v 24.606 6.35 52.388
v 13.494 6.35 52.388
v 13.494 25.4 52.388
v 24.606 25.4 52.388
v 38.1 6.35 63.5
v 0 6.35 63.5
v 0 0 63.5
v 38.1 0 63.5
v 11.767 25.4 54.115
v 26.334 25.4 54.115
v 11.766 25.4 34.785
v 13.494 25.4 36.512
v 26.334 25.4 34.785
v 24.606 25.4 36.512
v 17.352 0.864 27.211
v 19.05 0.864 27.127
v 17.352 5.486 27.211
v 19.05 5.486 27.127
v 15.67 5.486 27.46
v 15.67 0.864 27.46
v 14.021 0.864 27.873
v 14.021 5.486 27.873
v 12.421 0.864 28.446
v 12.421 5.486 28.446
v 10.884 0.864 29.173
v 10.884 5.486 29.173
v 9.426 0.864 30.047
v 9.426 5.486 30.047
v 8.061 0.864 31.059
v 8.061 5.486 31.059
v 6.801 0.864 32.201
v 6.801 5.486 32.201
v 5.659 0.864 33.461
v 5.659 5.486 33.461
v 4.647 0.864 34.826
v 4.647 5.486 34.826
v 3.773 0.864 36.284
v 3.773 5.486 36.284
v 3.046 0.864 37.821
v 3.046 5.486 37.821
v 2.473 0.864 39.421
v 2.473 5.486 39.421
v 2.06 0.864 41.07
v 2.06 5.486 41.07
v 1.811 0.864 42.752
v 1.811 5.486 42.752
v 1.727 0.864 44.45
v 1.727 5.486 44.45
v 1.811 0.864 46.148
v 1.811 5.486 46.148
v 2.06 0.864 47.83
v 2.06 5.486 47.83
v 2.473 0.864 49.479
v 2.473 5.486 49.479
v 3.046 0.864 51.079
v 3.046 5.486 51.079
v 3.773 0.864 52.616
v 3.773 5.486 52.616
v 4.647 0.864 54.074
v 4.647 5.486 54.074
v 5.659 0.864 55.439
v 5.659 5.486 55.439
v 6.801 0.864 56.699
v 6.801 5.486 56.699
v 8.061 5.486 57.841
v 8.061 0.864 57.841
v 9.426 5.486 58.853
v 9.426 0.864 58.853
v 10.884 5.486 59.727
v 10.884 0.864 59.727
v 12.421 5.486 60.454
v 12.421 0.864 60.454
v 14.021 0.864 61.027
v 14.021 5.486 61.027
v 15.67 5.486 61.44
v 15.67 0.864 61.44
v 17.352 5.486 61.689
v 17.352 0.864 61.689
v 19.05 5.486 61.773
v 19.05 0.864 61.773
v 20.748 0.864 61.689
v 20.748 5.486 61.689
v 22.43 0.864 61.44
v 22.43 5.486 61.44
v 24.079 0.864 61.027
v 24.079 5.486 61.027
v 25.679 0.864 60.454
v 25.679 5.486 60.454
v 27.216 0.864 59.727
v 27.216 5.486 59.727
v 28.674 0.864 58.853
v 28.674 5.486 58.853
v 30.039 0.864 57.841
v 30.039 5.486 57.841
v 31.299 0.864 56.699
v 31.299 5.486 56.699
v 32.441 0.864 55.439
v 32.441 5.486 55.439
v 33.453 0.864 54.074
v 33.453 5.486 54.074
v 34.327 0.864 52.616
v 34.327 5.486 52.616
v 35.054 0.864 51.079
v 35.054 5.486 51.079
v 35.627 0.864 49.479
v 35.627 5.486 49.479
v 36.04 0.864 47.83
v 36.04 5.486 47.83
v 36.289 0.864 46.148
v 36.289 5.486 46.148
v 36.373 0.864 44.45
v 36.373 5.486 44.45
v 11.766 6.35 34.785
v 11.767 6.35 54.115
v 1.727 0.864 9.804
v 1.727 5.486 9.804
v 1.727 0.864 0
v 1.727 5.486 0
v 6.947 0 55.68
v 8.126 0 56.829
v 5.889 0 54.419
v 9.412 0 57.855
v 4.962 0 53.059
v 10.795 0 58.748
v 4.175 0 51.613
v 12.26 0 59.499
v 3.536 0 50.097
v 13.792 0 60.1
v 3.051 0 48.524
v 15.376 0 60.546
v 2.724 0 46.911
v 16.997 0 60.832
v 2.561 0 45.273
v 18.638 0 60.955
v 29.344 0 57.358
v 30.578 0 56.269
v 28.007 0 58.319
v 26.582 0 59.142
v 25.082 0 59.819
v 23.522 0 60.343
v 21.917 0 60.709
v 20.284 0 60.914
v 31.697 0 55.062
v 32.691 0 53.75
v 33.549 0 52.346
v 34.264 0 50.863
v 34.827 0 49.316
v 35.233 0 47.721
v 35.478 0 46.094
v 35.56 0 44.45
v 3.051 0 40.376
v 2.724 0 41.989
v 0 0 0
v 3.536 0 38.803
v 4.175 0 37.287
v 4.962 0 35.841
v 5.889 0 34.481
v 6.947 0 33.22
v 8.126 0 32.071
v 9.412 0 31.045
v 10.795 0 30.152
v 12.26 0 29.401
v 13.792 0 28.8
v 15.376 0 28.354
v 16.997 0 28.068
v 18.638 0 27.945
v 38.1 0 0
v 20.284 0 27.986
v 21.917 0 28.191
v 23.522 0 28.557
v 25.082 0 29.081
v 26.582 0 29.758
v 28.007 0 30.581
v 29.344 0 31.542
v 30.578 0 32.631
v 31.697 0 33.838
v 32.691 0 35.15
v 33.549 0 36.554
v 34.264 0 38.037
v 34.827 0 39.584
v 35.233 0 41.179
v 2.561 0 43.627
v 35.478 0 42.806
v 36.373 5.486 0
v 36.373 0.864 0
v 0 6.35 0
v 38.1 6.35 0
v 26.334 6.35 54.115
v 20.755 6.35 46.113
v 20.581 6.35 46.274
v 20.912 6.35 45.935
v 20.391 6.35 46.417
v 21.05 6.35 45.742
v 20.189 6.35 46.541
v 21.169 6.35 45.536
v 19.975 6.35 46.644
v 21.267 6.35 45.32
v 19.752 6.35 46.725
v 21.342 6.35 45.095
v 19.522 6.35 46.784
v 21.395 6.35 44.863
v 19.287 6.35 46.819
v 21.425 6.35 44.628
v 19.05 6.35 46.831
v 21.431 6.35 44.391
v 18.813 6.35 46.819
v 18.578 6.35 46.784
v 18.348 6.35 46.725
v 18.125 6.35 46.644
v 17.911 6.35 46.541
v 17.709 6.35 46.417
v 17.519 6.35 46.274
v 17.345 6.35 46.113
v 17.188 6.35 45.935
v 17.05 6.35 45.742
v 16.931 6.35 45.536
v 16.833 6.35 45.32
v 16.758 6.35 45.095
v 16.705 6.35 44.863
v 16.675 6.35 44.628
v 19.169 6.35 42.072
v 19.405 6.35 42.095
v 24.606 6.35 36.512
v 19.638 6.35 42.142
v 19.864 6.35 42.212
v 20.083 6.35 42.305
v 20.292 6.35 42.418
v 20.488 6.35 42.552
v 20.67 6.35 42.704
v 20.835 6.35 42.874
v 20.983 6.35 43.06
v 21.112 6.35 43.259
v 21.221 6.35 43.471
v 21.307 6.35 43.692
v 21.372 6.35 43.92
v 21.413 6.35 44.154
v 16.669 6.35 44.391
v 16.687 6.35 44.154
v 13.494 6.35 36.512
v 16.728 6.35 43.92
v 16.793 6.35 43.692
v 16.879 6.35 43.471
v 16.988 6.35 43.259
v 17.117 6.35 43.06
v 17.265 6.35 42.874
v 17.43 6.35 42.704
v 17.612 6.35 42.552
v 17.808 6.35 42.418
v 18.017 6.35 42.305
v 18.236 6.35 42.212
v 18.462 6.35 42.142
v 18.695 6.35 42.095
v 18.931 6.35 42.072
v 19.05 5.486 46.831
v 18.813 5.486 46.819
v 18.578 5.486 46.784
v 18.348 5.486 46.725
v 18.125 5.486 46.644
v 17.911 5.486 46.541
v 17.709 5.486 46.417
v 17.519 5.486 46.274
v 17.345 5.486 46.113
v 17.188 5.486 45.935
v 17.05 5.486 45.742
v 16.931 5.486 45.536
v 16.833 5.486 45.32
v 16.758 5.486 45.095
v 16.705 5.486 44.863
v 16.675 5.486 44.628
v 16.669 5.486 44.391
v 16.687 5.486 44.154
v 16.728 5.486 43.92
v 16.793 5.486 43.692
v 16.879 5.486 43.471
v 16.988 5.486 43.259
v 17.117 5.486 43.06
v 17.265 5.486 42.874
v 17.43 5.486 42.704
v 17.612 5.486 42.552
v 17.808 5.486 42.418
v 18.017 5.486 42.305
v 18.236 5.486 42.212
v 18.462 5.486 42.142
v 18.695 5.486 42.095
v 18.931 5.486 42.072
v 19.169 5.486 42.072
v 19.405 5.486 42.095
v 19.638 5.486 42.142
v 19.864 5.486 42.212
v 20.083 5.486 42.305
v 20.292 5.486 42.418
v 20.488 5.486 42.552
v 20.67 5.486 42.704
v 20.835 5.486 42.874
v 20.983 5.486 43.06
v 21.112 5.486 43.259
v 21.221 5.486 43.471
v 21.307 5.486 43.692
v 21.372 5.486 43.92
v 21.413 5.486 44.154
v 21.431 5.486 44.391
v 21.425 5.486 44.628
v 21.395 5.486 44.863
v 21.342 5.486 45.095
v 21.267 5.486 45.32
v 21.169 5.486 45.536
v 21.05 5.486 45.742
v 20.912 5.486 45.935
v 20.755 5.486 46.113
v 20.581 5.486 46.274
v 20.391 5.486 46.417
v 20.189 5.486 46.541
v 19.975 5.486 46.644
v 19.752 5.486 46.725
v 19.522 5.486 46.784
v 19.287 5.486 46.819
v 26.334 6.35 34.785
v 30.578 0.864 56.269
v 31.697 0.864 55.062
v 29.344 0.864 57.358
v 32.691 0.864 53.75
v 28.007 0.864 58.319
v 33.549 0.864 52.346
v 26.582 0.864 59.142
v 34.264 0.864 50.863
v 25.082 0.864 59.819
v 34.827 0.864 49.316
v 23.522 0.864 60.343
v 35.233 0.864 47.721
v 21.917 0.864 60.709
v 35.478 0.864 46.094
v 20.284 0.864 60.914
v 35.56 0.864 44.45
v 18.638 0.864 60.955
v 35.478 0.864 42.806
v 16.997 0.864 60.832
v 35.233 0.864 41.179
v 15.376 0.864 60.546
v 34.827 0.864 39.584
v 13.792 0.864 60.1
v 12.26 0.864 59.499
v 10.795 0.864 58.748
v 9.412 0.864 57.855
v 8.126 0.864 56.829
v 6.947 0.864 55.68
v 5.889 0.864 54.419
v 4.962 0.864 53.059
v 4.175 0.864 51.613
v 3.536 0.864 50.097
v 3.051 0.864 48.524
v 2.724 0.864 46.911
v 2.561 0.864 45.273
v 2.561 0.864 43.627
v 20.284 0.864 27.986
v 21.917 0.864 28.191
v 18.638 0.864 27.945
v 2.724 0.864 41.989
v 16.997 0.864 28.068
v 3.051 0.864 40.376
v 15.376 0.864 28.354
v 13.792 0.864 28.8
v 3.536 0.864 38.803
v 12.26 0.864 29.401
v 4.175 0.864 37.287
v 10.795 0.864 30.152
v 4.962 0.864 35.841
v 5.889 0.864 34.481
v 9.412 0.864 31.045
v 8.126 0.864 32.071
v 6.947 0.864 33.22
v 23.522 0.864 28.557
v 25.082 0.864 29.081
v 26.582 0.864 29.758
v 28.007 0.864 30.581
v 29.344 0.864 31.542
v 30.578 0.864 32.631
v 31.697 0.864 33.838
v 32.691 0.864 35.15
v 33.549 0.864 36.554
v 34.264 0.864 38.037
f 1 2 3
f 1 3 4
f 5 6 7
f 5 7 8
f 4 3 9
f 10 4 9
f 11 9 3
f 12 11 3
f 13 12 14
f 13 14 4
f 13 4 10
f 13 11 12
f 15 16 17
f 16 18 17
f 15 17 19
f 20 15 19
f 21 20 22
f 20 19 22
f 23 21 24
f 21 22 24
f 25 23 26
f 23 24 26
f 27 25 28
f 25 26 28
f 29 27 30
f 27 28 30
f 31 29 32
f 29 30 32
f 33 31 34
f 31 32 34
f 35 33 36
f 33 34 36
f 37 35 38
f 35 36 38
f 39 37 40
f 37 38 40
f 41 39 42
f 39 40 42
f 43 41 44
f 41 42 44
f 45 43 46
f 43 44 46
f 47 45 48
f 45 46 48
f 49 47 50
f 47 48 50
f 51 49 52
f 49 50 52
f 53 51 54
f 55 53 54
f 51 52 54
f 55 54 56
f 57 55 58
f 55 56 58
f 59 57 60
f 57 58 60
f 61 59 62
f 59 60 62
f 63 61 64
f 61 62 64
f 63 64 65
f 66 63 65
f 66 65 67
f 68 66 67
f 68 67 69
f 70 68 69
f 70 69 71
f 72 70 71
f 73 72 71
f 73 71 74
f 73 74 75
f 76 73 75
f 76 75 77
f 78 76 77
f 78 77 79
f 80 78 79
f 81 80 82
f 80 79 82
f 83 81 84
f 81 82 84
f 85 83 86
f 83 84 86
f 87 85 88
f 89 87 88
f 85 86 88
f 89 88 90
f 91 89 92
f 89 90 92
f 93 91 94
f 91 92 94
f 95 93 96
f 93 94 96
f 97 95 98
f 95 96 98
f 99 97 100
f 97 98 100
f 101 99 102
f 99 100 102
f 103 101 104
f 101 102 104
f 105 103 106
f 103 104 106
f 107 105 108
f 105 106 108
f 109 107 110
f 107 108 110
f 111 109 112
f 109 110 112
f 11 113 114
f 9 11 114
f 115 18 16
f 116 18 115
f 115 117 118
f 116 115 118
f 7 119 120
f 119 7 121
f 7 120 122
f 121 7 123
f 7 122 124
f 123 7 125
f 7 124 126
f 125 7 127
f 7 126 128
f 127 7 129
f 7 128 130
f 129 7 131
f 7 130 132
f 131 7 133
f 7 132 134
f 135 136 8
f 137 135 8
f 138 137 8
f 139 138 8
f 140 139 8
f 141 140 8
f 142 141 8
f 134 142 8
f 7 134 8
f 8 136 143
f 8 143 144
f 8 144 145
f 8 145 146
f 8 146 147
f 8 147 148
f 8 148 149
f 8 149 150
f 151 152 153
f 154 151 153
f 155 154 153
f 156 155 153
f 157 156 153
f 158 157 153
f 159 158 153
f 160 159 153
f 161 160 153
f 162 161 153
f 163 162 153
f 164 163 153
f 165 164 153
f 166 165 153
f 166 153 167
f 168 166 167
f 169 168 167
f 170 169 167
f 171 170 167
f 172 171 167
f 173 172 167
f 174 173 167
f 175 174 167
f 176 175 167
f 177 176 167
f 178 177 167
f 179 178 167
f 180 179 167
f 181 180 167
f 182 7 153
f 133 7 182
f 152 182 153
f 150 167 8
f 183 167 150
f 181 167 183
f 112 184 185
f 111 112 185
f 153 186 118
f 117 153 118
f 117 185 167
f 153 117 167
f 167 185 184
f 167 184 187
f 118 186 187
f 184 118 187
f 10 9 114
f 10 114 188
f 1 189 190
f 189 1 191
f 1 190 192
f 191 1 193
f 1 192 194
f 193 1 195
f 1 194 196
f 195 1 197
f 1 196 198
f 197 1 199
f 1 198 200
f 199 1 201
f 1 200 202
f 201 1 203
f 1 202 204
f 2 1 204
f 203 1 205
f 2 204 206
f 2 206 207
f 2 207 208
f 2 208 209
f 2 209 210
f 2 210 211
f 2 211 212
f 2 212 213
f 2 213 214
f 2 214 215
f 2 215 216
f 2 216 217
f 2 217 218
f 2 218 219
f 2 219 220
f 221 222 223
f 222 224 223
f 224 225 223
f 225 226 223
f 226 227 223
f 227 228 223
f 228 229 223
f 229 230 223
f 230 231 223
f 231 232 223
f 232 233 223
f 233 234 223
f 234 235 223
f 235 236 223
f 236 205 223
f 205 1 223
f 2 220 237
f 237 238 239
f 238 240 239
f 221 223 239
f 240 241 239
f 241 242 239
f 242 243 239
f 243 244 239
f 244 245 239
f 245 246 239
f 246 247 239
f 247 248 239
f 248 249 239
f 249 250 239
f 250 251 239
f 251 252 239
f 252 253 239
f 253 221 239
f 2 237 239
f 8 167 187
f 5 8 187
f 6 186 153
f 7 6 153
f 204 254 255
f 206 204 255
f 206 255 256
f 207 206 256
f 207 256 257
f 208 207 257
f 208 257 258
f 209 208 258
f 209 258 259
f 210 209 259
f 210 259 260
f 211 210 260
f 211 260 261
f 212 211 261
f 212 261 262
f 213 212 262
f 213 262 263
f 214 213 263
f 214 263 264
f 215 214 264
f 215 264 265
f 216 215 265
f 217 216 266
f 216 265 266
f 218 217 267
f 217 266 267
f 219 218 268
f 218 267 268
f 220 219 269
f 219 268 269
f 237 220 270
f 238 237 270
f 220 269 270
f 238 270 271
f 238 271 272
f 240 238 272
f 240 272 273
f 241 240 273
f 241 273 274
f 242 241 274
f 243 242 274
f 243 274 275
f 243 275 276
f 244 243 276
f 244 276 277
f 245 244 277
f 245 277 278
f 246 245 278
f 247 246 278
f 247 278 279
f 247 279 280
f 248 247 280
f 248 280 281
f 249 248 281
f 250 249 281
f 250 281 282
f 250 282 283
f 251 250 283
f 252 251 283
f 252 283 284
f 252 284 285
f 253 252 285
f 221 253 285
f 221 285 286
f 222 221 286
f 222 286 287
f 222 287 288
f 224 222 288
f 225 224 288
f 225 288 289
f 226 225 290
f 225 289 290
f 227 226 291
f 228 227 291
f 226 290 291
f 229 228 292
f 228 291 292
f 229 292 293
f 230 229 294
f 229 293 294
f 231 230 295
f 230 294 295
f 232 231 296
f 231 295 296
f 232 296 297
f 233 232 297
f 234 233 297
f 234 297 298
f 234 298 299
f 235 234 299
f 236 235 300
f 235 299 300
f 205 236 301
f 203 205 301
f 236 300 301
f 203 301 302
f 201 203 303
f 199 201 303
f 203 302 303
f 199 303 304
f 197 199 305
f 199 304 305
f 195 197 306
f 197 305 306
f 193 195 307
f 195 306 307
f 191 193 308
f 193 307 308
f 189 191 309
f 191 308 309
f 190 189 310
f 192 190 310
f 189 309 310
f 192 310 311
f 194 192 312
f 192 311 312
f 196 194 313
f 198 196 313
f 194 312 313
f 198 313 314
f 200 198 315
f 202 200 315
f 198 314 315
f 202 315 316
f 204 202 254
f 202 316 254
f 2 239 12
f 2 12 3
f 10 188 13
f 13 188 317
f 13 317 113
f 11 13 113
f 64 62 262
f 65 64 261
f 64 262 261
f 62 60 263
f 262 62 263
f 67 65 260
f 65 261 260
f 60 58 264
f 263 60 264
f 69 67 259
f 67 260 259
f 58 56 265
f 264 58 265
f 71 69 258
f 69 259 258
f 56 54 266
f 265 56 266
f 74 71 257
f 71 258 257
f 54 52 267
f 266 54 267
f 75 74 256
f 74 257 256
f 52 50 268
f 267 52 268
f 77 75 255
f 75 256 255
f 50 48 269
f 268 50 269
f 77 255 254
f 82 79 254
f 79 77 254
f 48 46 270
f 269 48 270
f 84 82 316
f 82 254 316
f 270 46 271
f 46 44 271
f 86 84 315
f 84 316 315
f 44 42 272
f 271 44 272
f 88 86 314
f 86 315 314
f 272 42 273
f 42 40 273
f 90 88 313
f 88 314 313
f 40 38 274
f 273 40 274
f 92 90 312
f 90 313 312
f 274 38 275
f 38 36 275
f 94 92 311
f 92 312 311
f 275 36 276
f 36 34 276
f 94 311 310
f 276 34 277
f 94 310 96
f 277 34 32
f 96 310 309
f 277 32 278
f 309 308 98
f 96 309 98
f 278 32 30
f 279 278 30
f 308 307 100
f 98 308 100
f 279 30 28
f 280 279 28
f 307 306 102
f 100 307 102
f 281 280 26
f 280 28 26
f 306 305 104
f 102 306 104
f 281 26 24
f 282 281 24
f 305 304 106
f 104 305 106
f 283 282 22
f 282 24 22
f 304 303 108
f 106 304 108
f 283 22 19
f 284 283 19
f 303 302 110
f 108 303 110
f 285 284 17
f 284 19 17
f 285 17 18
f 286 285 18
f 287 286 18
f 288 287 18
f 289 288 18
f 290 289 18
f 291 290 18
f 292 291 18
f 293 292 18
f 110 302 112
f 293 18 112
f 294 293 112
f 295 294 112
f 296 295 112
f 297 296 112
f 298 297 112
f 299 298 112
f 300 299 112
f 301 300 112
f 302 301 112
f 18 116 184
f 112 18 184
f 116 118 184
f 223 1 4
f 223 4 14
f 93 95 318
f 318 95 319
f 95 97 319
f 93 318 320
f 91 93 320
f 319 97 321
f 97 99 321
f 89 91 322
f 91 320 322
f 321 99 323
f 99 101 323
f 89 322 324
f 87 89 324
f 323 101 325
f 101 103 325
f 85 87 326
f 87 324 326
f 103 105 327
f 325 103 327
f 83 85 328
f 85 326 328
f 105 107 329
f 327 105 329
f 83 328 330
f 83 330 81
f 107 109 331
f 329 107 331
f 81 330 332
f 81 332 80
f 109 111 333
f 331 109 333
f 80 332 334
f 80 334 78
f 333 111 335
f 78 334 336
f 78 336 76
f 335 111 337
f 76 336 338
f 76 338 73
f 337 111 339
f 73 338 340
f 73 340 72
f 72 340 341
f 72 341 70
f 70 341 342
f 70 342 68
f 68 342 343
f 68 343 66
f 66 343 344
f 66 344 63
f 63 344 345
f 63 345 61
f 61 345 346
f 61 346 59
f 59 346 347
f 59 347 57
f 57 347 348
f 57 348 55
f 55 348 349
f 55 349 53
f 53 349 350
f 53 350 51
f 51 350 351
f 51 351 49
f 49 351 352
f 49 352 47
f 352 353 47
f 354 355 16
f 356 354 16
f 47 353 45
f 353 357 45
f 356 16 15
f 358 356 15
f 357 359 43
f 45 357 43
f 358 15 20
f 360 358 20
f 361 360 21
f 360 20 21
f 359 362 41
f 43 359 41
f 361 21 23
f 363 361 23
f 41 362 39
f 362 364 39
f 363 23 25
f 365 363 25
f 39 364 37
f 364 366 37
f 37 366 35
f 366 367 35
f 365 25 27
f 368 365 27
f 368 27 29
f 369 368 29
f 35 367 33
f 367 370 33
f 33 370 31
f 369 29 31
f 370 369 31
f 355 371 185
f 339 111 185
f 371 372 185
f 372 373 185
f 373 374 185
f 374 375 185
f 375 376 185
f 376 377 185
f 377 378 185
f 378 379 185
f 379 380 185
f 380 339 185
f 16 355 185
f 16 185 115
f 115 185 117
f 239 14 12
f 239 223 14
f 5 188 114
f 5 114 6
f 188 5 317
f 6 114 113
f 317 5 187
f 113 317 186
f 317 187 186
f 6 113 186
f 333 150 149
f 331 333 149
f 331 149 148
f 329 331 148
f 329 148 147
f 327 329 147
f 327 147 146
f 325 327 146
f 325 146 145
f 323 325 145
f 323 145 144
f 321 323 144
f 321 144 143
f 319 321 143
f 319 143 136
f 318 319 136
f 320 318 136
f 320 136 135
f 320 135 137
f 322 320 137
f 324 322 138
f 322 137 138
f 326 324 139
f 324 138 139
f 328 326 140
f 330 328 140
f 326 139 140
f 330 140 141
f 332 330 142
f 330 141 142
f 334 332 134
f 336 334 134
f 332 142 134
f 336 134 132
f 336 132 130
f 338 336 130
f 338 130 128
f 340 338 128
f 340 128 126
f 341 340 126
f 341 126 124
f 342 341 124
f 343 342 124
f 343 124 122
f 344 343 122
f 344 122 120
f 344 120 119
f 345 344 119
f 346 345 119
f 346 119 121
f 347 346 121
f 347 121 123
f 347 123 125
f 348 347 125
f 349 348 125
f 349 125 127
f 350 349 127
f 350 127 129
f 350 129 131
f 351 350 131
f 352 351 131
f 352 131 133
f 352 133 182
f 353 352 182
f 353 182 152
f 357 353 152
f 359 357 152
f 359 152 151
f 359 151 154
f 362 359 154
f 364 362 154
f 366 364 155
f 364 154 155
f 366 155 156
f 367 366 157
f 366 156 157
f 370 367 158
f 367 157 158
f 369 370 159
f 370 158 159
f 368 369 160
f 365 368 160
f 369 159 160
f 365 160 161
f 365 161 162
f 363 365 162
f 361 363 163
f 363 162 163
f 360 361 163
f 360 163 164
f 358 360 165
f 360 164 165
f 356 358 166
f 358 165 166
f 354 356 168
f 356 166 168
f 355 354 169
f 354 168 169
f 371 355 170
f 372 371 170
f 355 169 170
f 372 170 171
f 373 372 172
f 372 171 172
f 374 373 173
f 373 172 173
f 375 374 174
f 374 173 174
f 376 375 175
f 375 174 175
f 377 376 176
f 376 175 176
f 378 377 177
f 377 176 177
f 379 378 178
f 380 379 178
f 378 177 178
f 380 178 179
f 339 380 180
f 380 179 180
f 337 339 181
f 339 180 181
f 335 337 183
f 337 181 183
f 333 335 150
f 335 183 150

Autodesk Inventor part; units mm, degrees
ref_plane "YZ Plane" through (0, 0, 0) normal (1, 0, 0) x (0, 1, 0)
ref_plane "XZ Plane" through (0, 0, 0) normal (0, 1, 0) x (-1, 0, 0)
ref_plane "XY Plane" through (0, 0, 0) normal (0, 0, 1) x (1, 0, 0)
sketch "Sketch1" plane through (0, 0, 0) normal (0, 0, 1) x (1, 0, 0)
  line L0 (0, 0) -> (38.1, 0)
  line L1 (38.1, 0) -> (38.1, 6.35)
  line L2 (38.1, 6.35) -> (0, 6.35)
  line L3 (0, 6.35) -> (0, 0)
  line L4 (1.7272, 5.4864) -> (36.3728, 5.4864)
  line L5 (36.3728, 5.4864) -> (36.3728, 0.8636)
  line L6 (36.3728, 0.8636) -> (1.7272, 0.8636)
  line L7 (1.7272, 0.8636) -> (1.7272, 5.4864)
  dimension "d0" = 38.1
  dimension "d1" = 6.35
  dimension "d2" = 0.8636
  dimension "d3" = 1.7272
  dimension "d4" = 0.8636
  dimension "d5" = 1.7272
extrude "Extrusion1" add sketch "Sketch1" along normal blind 63.5
sketch "Sketch2" plane through (0, 0, 0) normal (0, -1, 0) x (1, 0, 0)
  line L0 (0, 63.5) -> (38.1, 63.5) projected
  circle A0 centre (19.05, 44.45) radius 16.51
  point P0 (0, 0)
  point P1 (19.05, 63.5)
  point P2 (19.05, 63.5)
  dimension "d8" = 33.02
  dimension "d9" = 19.05
extrude "Extrusion2" cut sketch "Sketch2" against normal up to next
sketch "Sketch3" plane through (1.7272, 5.4864, 0) normal (0, -1, 0) x (1, 0, 0)
  circle A0 centre (17.3228, 44.45) radius 16.51 construction
  line L0 (36.3728, 63.5) -> (-1.7272, 63.5) construction
  arc A1 (0, 44.45) -> (17.3228, 27.1272) centre (17.3228, 44.45) ccw
  line L1 (17.3228, 44.45) -> (0, 44.45) construction
  line L2 (17.3228, 44.45) -> (34.6456, 44.45) construction
  line L3 (17.3228, 44.45) -> (17.3228, 27.1272) construction
  line L4 (-1.7272, 0) -> (-1.7272, 63.5) projected
  arc A2 (17.3228, 27.1272) -> (0, 9.8044) centre (17.3228, 9.8044) ccw
  line L5 (17.3228, 9.8044) -> (0, 9.8044) construction
  line L6 (17.3228, 9.8044) -> (17.3228, 27.1272) construction
  arc A3 (34.6456, 44.45) -> (0, 44.45) centre (17.3228, 44.45) ccw
  line L7 (34.6456, 44.45) -> (34.6456, 61.7728)
  line L8 (34.6456, 61.7728) -> (0, 61.7728)
  line L9 (0, 61.7728) -> (0, 9.8044)
  point P0 (17.3228, 63.5)
  point P1 (17.3228, 61.7728)
  dimension "d12" = 33.02
  dimension "d13" = 19.05
  dimension "d14" = 180
  dimension "d15" = 90
  dimension "d16" = 1.7272
  dimension "d17" = 90
  dimension "d19" = 1.7272
  dimension "d20" = 19.05
extrude "Extrusion4" add sketch "Sketch3" along normal up to next contours L8 L7 A3
sketch "Sketch5" plane through (1.7272, 5.4864, 63.5) normal (0, -1, 0) x (1, 0, 0)
  arc A0 (17.3228, -1.7272) -> (0, -19.05) centre (17.3228, -19.05) ccw
  line L0 (17.3228, -19.05) -> (0, -19.05) construction
  line L1 (17.3228, -19.05) -> (17.3228, -1.7272) construction
  line L2 (36.3728, 0) -> (-1.7272, 0) construction
  line L3 (-1.7272, -63.5) -> (-1.7272, 0) construction
  line L4 (17.3228, -1.7272) -> (0, -1.7272)
  line L5 (0, -1.7272) -> (0, -19.05)
  point P0 (17.3228, 0)
  dimension "d35" = 90
  dimension "d36" = 1.7272
  dimension "d37" = 1.7272
extrude "Extrusion5" add sketch "Sketch5" along normal up to next
sketch "Sketch6" plane through (1.7272, 5.4864, 0) normal (0, -1, 0) x (1, 0, 0)
  arc A0 (0, 44.45) -> (17.3228, 27.1272) centre (17.3228, 44.45) ccw
  line L0 (17.3228, 44.45) -> (17.3228, 27.1272) construction
  line L1 (17.3228, 44.45) -> (0, 44.45) construction
  line L2 (36.3728, 63.5) -> (-1.7272, 63.5) projected
  line L3 (-1.7272, 0) -> (-1.7272, 63.5) projected
  line L4 (17.3228, 9.8044) -> (0, 9.8044) construction
  line L5 (17.3228, 9.8044) -> (17.3228, 27.1272) construction
  line L6 (0, 44.45) -> (0, 9.8044)
  line L7 (17.3228, 27.1272) -> (0, 9.8044)
  point P0 (17.3228, 63.5)
  dimension "d40" = 90
  dimension "d41" = 1.7272
  dimension "d42" = 19.05
  dimension "d43" = 90
  dimension "d44" = 1.7272
  dimension "d45" = 17.3228
extrude "Extrusion6" add sketch "Sketch6" along normal up to next
sketch "Sketch7" plane through (1.7272, 5.4864, 61.7728) normal (0, 0, 1) x (1, 0, 0)
  line L0 (17.3228, -4.6228) -> (0, -4.6228) projected
  line L1 (17.3228, 0) -> (34.6456, 0) projected
  line L2 (0, -4.6228) -> (34.6456, -4.6228)
  line L3 (34.6456, -4.6228) -> (34.6456, 0)
  line L4 (34.6456, 0) -> (0, 0)
  line L5 (0, 0) -> (0, -4.6228)
  point P0 (-1.7272, -5.4864)
extrude "Extrusion7" add sketch "Sketch7" along normal blind 1.7272
sketch "Sketch8" plane through (0, 6.35, 0) normal (0, 1, 0) x (1, 0, 0)
  line L0 (38.1, -63.5) -> (0, -63.5) projected
  line L1 (13.4938, -52.3875) -> (24.6062, -52.3875)
  line L2 (24.6062, -52.3875) -> (24.6062, -36.5125)
  line L3 (24.6062, -36.5125) -> (13.4938, -36.5125)
  line L4 (13.4938, -36.5125) -> (13.4938, -52.3875)
  line L5 (11.7666, -54.1147) -> (26.3335, -54.1147)
  line L6 (26.3335, -54.1147) -> (26.3335, -34.7853)
  line L7 (26.3335, -34.7853) -> (11.7665, -34.7853)
  line L8 (11.7665, -34.7853) -> (11.7666, -54.1147)
  point P0 (0, 0)
  point P1 (19.05, -44.45)
  point P2 (19.05, -63.5)
  point P3 (19.05, -36.5125)
  point P4 (13.4937, -44.45)
  dimension "d50" = 19.05
  dimension "d51" = 11.1125
  dimension "d52" = 15.875
  dimension "d53" = 1.7272
  dimension "d54" = 1.7272
  dimension "d55" = 1.7272
  dimension "d56" = 1.7272
extrude "Extrusion8" add sketch "Sketch8" along normal blind 19.05
sketch "Sketch9" plane through (0, 6.35, 0) normal (0, 1, 0) x (1, 0, 0)
  line L0 (38.1, -63.5) -> (0, -63.5) projected
  line L1 (13.4938, -52.3875) -> (13.4938, -36.5125) projected
  point P0 (0, 0)
  point P1 (19.05, -44.45)
  point P2 (19.05, -63.5)
  point P3 (13.4938, -44.45)
hole "Hole1" at (19.05, 6.35, 44.45) direction (0, -1, 0) diameter 4.7625 end through all
properties part number "main_chassis"
